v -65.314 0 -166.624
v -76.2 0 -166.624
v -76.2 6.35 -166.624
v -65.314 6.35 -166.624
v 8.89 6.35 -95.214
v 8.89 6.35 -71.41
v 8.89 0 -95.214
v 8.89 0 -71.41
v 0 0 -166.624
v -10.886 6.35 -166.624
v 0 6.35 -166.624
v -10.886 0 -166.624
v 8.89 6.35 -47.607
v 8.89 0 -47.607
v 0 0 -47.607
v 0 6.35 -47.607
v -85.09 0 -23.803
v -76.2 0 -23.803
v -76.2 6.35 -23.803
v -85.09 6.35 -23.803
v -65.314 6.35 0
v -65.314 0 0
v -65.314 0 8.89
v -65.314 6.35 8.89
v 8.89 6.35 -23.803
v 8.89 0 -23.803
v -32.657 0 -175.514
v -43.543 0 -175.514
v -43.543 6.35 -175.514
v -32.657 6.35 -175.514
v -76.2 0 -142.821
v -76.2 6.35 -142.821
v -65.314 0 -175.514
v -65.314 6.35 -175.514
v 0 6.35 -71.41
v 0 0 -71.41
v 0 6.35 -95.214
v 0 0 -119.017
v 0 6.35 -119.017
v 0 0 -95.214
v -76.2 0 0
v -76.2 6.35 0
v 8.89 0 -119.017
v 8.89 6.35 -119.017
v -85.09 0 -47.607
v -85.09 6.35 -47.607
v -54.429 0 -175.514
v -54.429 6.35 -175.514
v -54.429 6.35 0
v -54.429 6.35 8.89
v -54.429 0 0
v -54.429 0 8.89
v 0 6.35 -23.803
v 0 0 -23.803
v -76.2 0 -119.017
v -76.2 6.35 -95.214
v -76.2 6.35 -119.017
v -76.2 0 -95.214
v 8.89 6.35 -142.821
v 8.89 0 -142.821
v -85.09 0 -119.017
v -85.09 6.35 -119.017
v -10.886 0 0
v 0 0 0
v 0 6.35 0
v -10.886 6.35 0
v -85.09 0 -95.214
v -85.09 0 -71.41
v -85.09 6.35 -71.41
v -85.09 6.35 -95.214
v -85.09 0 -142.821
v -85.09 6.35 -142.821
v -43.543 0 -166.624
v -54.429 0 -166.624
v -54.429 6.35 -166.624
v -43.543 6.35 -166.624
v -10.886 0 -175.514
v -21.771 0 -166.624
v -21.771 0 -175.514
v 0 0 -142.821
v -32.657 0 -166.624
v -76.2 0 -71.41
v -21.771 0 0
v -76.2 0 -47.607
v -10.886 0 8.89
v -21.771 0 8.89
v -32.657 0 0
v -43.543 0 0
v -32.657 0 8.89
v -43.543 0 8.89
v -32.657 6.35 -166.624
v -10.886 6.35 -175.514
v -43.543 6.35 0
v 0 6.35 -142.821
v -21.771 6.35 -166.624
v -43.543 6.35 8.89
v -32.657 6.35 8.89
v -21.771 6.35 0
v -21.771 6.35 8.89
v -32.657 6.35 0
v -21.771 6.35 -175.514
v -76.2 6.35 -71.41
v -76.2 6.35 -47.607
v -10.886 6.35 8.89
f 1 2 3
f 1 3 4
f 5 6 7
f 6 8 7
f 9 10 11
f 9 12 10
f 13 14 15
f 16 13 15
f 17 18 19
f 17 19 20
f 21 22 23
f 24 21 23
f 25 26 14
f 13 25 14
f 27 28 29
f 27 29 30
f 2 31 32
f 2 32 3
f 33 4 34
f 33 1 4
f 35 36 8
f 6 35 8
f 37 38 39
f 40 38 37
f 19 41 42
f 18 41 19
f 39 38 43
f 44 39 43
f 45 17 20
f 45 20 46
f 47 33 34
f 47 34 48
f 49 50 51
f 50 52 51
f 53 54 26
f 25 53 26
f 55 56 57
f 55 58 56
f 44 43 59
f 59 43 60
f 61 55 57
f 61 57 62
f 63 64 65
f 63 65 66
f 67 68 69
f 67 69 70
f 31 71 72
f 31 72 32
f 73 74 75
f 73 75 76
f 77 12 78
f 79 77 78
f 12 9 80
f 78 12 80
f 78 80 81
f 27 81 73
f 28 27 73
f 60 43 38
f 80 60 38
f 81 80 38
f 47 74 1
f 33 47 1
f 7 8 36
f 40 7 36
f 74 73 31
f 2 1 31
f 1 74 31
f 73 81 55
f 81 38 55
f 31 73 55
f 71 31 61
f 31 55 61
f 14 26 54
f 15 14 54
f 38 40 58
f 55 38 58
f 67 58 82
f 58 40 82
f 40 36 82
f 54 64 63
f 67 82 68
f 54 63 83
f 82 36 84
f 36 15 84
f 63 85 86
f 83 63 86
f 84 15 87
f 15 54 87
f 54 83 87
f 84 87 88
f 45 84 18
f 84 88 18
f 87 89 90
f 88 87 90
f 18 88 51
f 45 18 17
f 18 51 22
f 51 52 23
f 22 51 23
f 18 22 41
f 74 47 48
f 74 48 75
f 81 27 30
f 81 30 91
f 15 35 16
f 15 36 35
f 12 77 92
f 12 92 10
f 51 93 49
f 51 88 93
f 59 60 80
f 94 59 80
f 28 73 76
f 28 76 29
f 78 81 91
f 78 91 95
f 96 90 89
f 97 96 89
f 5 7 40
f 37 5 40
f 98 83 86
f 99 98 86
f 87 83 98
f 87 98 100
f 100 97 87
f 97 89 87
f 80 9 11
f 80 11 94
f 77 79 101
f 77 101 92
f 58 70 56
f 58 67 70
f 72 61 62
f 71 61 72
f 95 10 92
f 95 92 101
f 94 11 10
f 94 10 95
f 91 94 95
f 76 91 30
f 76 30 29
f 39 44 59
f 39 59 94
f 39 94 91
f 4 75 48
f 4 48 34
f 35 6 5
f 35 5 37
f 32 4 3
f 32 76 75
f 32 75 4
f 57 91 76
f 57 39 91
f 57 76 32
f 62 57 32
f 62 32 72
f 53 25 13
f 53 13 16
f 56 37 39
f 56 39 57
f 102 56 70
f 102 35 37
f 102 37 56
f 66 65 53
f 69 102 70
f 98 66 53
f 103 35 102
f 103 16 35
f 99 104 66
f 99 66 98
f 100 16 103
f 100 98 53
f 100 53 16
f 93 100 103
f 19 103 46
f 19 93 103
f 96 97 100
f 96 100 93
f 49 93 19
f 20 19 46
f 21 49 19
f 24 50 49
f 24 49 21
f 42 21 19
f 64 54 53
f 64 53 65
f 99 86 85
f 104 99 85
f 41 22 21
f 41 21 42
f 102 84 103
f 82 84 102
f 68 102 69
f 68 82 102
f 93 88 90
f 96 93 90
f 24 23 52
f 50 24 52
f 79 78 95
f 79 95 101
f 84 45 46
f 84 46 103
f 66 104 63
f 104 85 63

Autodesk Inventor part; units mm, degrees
ref_plane "YZ Plane" through (0, 0, 0) normal (1, 0, 0) x (0, 1, 0)
ref_plane "XZ Plane" through (0, 0, 0) normal (0, 1, 0) x (-1, 0, 0)
ref_plane "XY Plane" through (0, 0, 0) normal (0, 0, 1) x (1, 0, 0)
sketch "Sketch1" plane through (0, 0, 0) normal (0, 1, 0) x (-1, 0, 0)
  point P0 (0, 0)
sketch "Sketch2" plane through (0, 0, 0) normal (0, 1, 0) x (-1, 0, 0)
  line L0 (0, 0) -> (76.2, 0)
  line L1 (76.2, 0) -> (76.2, -166.624)
  line L2 (76.2, -166.624) -> (0, -166.624)
  line L3 (0, -166.624) -> (0, 0)
  dimension "d0" = 76.2
  dimension "d1" = 166.624
extrude "Base Extrusion" add sketch "Sketch2" along normal blind 6.35
sketch "Sketch3" plane through (0, 0, 0) normal (0, 1, 0) x (-1, 0, 0)
  line L0 (76.2, 0) -> (0, 0) projected
  line L1 (0, 0) -> (0, -166.624) projected
  line L2 (0, -166.624) -> (76.2, -166.624) projected
  line L3 (76.2, -166.624) -> (76.2, 0) projected
  line L4 (10.8857, 0) -> (21.7714, 0)
  line L5 (21.7714, 0) -> (21.7714, 8.89)
  line L6 (21.7714, 8.89) -> (10.8857, 8.89)
  line L7 (10.8857, 8.89) -> (10.8857, 0)
  line L8 (32.6571, 0) -> (43.5429, 0)
  line L9 (43.5429, 0) -> (43.5429, 8.89)
  line L10 (43.5429, 8.89) -> (32.6571, 8.89)
  line L11 (32.6571, 8.89) -> (32.6571, 0)
  line L12 (54.4286, 0) -> (65.3143, 0)
  line L13 (65.3143, 0) -> (65.3143, 8.89)
  line L14 (65.3143, 8.89) -> (54.4286, 8.89)
  line L15 (54.4286, 8.89) -> (54.4286, 0)
  line L16 (76.2, -83.312) -> (0, -83.312) construction
  line L17 (76.2, -166.624) -> (0, -166.624)
  line L18 (10.8857, -166.624) -> (21.7714, -166.624)
  line L19 (21.7714, -166.624) -> (21.7714, -175.514)
  line L20 (21.7714, -175.514) -> (10.8857, -175.514)
  line L21 (10.8857, -175.514) -> (10.8857, -166.624)
  line L22 (43.5429, -166.624) -> (43.5429, -175.514)
  line L23 (43.5429, -175.514) -> (32.6571, -175.514)
  line L24 (32.6571, -175.514) -> (32.6571, -166.624)
  line L25 (32.6571, -166.624) -> (43.5429, -166.624)
  line L26 (65.3143, -166.624) -> (65.3143, -175.514)
  line L27 (65.3143, -175.514) -> (54.4286, -175.514)
  line L28 (54.4286, -175.514) -> (54.4286, -166.624)
  line L29 (54.4286, -166.624) -> (65.3143, -166.624)
  line L30 (38.1, 0) -> (38.1, -166.624) construction
  line L31 (0, -23.8034) -> (-8.89, -23.8034)
  line L32 (-8.89, -23.8034) -> (-8.89, -47.6069)
  line L33 (-8.89, -47.6069) -> (0, -47.6069)
  line L34 (0, -47.6069) -> (0, -23.8034)
  line L35 (0, -71.4103) -> (-8.89, -71.4103)
  line L36 (-8.89, -71.4103) -> (-8.89, -95.2137)
  line L37 (-8.89, -95.2137) -> (0, -95.2137)
  line L38 (0, -95.2137) -> (0, -71.4103)
  line L39 (0, -119.0171) -> (-8.89, -119.0171)
  line L40 (-8.89, -119.0171) -> (-8.89, -142.8206)
  line L41 (-8.89, -142.8206) -> (0, -142.8206)
  line L42 (0, -142.8206) -> (0, -119.0171)
  line L43 (76.2, 0) -> (76.2, -166.624)
  line L44 (76.2, -23.8034) -> (85.09, -23.8034)
  line L45 (85.09, -23.8034) -> (85.09, -47.6069)
  line L46 (85.09, -47.6069) -> (76.2, -47.6069)
  line L47 (76.2, -47.6069) -> (76.2, -23.8034)
  line L48 (76.2, -71.4103) -> (85.09, -71.4103)
  line L49 (85.09, -71.4103) -> (85.09, -95.2137)
  line L50 (85.09, -95.2137) -> (76.2, -95.2137)
  line L51 (76.2, -95.2137) -> (76.2, -71.4103)
  line L52 (76.2, -119.0171) -> (85.09, -119.0171)
  line L53 (85.09, -119.0171) -> (85.09, -142.8206)
  line L54 (85.09, -142.8206) -> (76.2, -142.8206)
  line L55 (76.2, -142.8206) -> (76.2, -119.0171)
  dimension "d4" = 10.8857
  dimension "d5" = 8.89
  dimension "d6" = 10.8857
  dimension "d7" = 10.8857
  dimension "d8" = 8.89
  dimension "d9" = 10.8857
  dimension "d10" = 8.89
  dimension "d11" = 10.8857
  dimension "d13" = 10.8857
  dimension "d14" = 76.2
  dimension "d15" = 23.8034
  dimension "d16" = 166.624
  dimension "d17" = 8.89
  dimension "d18" = 23.8034
  dimension "d19" = 8.89
  dimension "d20" = 23.8034
  dimension "d21" = 8.89
  dimension "d22" = 23.8034
  dimension "d23" = 23.8034
  dimension "d24" = 23.8034
extrude "Connections" add sketch "Sketch3" along normal blind 6.35 contours L0 L15 L14 L13 | L44 L45 L46 L3 | L0 L11 L10 L9 | L48 L49 L50 L3 | L0 L7 L6 L5 | L52 L53 L54 L3 | L1 L33 L32 L31 | L26 L27 L28 L2 | L1 L37 L36 L35 | L22 L23 L24 L2 | L1 L41 L40 L39 | L19 L20 L21 L2
sketch "Sketch5" plane through (0, 6.35, 0) normal (0, 1, 0) x (1, 0, 0)
  line L0 (-76.2, 0) -> (-65.3143, 0) projected
  line L1 (-65.3143, 0) -> (-65.3143, -8.89) projected
  line L2 (-65.3143, -8.89) -> (-54.4286, -8.89) projected
  line L3 (-54.4286, -8.89) -> (-54.4286, 0) projected
  line L4 (-54.4286, 0) -> (-43.5429, 0) projected
  line L5 (-43.5429, 0) -> (-43.5429, -8.89) projected
  line L6 (-43.5429, -8.89) -> (-32.6571, -8.89) projected
  line L7 (-32.6571, -8.89) -> (-32.6571, 0) projected
  line L8 (-32.6571, 0) -> (-21.7714, 0) projected
  line L9 (-21.7714, 0) -> (-21.7714, -8.89) projected
  line L10 (-21.7714, -8.89) -> (-10.8857, -8.89) projected
  line L11 (-10.8857, -8.89) -> (-10.8857, 0) projected
  line L12 (-10.8857, 0) -> (0, 0) projected
  line L13 (0, 0) -> (0, 23.8034) projected
  line L14 (0, 23.8034) -> (8.89, 23.8034) projected
  line L15 (8.89, 23.8034) -> (8.89, 47.6069) projected
  line L16 (8.89, 47.6069) -> (0, 47.6069) projected
  line L17 (0, 47.6069) -> (0, 71.4103) projected
  line L18 (0, 71.4103) -> (8.89, 71.4103) projected
  line L19 (8.89, 71.4103) -> (8.89, 95.2137) projected
  line L20 (8.89, 95.2137) -> (0, 95.2137) projected
  line L21 (0, 95.2137) -> (0, 119.0171) projected
  line L22 (0, 119.0171) -> (8.89, 119.0171) projected
  line L23 (8.89, 119.0171) -> (8.89, 142.8206) projected
  line L24 (8.89, 142.8206) -> (0, 142.8206) projected
  line L25 (0, 142.8206) -> (0, 166.624) projected
  line L26 (0, 166.624) -> (-10.8857, 166.624) projected
  line L27 (-10.8857, 166.624) -> (-10.8857, 175.514) projected
  line L28 (-10.8857, 175.514) -> (-21.7714, 175.514) projected
  line L29 (-21.7714, 175.514) -> (-21.7714, 166.624) projected
  line L30 (-21.7714, 166.624) -> (-32.6571, 166.624) projected
  line L31 (-32.6571, 166.624) -> (-32.6571, 175.514) projected
  line L32 (-32.6571, 175.514) -> (-43.5429, 175.514) projected
  line L33 (-43.5429, 175.514) -> (-43.5429, 166.624) projected
  line L34 (-43.5429, 166.624) -> (-54.4286, 166.624) projected
  line L35 (-54.4286, 166.624) -> (-54.4286, 175.514) projected
  line L36 (-54.4286, 175.514) -> (-65.3143, 175.514) projected
  line L37 (-65.3143, 175.514) -> (-65.3143, 166.624) projected
  line L38 (-65.3143, 166.624) -> (-76.2, 166.624) projected
  line L39 (-76.2, 166.624) -> (-76.2, 142.8206) projected
  line L40 (-76.2, 142.8206) -> (-85.09, 142.8206) projected
  line L41 (-85.09, 142.8206) -> (-85.09, 119.0171) projected
  line L42 (-85.09, 119.0171) -> (-76.2, 119.0171) projected
  line L43 (-76.2, 119.0171) -> (-76.2, 95.2137) projected
  line L44 (-76.2, 95.2137) -> (-85.09, 95.2137) projected
  line L45 (-85.09, 95.2137) -> (-85.09, 71.4103) projected
  line L46 (-85.09, 71.4103) -> (-76.2, 71.4103) projected
  line L47 (-76.2, 71.4103) -> (-76.2, 47.6069) projected
  line L48 (-76.2, 47.6069) -> (-85.09, 47.6069) projected
  line L49 (-85.09, 47.6069) -> (-85.09, 23.8034) projected
  line L50 (-85.09, 23.8034) -> (-76.2, 23.8034) projected
  line L51 (-76.2, 23.8034) -> (-76.2, 0) projected
equation "\"d5\" = WallConA"
equation "\"d6\" = -0.75 * d4 + 0.25 * d14"
equation "\"d7\" = d4"
equation "\"d8\" = d5"
equation "\"d9\" = d4"
equation "\"d10\" = d5"
equation "\"d11\" = d6"
equation "\"d13\" = d6"
equation "\"d15\" = -0.75 * d18 + 0.25 * d16"
equation "\"d17\" = WallConA"
equation "\"d18\" = 0.142857 * d16"
equation "\"d19\" = d17"
equation "\"d20\" = d18"
equation "\"d21\" = d17"
equation "\"d22\" = d18"
equation "\"d23\" = d15"
equation "\"d24\" = d15"
equation "\"WallConA\" = 8.89"
properties part number "Cap(Reader)"
